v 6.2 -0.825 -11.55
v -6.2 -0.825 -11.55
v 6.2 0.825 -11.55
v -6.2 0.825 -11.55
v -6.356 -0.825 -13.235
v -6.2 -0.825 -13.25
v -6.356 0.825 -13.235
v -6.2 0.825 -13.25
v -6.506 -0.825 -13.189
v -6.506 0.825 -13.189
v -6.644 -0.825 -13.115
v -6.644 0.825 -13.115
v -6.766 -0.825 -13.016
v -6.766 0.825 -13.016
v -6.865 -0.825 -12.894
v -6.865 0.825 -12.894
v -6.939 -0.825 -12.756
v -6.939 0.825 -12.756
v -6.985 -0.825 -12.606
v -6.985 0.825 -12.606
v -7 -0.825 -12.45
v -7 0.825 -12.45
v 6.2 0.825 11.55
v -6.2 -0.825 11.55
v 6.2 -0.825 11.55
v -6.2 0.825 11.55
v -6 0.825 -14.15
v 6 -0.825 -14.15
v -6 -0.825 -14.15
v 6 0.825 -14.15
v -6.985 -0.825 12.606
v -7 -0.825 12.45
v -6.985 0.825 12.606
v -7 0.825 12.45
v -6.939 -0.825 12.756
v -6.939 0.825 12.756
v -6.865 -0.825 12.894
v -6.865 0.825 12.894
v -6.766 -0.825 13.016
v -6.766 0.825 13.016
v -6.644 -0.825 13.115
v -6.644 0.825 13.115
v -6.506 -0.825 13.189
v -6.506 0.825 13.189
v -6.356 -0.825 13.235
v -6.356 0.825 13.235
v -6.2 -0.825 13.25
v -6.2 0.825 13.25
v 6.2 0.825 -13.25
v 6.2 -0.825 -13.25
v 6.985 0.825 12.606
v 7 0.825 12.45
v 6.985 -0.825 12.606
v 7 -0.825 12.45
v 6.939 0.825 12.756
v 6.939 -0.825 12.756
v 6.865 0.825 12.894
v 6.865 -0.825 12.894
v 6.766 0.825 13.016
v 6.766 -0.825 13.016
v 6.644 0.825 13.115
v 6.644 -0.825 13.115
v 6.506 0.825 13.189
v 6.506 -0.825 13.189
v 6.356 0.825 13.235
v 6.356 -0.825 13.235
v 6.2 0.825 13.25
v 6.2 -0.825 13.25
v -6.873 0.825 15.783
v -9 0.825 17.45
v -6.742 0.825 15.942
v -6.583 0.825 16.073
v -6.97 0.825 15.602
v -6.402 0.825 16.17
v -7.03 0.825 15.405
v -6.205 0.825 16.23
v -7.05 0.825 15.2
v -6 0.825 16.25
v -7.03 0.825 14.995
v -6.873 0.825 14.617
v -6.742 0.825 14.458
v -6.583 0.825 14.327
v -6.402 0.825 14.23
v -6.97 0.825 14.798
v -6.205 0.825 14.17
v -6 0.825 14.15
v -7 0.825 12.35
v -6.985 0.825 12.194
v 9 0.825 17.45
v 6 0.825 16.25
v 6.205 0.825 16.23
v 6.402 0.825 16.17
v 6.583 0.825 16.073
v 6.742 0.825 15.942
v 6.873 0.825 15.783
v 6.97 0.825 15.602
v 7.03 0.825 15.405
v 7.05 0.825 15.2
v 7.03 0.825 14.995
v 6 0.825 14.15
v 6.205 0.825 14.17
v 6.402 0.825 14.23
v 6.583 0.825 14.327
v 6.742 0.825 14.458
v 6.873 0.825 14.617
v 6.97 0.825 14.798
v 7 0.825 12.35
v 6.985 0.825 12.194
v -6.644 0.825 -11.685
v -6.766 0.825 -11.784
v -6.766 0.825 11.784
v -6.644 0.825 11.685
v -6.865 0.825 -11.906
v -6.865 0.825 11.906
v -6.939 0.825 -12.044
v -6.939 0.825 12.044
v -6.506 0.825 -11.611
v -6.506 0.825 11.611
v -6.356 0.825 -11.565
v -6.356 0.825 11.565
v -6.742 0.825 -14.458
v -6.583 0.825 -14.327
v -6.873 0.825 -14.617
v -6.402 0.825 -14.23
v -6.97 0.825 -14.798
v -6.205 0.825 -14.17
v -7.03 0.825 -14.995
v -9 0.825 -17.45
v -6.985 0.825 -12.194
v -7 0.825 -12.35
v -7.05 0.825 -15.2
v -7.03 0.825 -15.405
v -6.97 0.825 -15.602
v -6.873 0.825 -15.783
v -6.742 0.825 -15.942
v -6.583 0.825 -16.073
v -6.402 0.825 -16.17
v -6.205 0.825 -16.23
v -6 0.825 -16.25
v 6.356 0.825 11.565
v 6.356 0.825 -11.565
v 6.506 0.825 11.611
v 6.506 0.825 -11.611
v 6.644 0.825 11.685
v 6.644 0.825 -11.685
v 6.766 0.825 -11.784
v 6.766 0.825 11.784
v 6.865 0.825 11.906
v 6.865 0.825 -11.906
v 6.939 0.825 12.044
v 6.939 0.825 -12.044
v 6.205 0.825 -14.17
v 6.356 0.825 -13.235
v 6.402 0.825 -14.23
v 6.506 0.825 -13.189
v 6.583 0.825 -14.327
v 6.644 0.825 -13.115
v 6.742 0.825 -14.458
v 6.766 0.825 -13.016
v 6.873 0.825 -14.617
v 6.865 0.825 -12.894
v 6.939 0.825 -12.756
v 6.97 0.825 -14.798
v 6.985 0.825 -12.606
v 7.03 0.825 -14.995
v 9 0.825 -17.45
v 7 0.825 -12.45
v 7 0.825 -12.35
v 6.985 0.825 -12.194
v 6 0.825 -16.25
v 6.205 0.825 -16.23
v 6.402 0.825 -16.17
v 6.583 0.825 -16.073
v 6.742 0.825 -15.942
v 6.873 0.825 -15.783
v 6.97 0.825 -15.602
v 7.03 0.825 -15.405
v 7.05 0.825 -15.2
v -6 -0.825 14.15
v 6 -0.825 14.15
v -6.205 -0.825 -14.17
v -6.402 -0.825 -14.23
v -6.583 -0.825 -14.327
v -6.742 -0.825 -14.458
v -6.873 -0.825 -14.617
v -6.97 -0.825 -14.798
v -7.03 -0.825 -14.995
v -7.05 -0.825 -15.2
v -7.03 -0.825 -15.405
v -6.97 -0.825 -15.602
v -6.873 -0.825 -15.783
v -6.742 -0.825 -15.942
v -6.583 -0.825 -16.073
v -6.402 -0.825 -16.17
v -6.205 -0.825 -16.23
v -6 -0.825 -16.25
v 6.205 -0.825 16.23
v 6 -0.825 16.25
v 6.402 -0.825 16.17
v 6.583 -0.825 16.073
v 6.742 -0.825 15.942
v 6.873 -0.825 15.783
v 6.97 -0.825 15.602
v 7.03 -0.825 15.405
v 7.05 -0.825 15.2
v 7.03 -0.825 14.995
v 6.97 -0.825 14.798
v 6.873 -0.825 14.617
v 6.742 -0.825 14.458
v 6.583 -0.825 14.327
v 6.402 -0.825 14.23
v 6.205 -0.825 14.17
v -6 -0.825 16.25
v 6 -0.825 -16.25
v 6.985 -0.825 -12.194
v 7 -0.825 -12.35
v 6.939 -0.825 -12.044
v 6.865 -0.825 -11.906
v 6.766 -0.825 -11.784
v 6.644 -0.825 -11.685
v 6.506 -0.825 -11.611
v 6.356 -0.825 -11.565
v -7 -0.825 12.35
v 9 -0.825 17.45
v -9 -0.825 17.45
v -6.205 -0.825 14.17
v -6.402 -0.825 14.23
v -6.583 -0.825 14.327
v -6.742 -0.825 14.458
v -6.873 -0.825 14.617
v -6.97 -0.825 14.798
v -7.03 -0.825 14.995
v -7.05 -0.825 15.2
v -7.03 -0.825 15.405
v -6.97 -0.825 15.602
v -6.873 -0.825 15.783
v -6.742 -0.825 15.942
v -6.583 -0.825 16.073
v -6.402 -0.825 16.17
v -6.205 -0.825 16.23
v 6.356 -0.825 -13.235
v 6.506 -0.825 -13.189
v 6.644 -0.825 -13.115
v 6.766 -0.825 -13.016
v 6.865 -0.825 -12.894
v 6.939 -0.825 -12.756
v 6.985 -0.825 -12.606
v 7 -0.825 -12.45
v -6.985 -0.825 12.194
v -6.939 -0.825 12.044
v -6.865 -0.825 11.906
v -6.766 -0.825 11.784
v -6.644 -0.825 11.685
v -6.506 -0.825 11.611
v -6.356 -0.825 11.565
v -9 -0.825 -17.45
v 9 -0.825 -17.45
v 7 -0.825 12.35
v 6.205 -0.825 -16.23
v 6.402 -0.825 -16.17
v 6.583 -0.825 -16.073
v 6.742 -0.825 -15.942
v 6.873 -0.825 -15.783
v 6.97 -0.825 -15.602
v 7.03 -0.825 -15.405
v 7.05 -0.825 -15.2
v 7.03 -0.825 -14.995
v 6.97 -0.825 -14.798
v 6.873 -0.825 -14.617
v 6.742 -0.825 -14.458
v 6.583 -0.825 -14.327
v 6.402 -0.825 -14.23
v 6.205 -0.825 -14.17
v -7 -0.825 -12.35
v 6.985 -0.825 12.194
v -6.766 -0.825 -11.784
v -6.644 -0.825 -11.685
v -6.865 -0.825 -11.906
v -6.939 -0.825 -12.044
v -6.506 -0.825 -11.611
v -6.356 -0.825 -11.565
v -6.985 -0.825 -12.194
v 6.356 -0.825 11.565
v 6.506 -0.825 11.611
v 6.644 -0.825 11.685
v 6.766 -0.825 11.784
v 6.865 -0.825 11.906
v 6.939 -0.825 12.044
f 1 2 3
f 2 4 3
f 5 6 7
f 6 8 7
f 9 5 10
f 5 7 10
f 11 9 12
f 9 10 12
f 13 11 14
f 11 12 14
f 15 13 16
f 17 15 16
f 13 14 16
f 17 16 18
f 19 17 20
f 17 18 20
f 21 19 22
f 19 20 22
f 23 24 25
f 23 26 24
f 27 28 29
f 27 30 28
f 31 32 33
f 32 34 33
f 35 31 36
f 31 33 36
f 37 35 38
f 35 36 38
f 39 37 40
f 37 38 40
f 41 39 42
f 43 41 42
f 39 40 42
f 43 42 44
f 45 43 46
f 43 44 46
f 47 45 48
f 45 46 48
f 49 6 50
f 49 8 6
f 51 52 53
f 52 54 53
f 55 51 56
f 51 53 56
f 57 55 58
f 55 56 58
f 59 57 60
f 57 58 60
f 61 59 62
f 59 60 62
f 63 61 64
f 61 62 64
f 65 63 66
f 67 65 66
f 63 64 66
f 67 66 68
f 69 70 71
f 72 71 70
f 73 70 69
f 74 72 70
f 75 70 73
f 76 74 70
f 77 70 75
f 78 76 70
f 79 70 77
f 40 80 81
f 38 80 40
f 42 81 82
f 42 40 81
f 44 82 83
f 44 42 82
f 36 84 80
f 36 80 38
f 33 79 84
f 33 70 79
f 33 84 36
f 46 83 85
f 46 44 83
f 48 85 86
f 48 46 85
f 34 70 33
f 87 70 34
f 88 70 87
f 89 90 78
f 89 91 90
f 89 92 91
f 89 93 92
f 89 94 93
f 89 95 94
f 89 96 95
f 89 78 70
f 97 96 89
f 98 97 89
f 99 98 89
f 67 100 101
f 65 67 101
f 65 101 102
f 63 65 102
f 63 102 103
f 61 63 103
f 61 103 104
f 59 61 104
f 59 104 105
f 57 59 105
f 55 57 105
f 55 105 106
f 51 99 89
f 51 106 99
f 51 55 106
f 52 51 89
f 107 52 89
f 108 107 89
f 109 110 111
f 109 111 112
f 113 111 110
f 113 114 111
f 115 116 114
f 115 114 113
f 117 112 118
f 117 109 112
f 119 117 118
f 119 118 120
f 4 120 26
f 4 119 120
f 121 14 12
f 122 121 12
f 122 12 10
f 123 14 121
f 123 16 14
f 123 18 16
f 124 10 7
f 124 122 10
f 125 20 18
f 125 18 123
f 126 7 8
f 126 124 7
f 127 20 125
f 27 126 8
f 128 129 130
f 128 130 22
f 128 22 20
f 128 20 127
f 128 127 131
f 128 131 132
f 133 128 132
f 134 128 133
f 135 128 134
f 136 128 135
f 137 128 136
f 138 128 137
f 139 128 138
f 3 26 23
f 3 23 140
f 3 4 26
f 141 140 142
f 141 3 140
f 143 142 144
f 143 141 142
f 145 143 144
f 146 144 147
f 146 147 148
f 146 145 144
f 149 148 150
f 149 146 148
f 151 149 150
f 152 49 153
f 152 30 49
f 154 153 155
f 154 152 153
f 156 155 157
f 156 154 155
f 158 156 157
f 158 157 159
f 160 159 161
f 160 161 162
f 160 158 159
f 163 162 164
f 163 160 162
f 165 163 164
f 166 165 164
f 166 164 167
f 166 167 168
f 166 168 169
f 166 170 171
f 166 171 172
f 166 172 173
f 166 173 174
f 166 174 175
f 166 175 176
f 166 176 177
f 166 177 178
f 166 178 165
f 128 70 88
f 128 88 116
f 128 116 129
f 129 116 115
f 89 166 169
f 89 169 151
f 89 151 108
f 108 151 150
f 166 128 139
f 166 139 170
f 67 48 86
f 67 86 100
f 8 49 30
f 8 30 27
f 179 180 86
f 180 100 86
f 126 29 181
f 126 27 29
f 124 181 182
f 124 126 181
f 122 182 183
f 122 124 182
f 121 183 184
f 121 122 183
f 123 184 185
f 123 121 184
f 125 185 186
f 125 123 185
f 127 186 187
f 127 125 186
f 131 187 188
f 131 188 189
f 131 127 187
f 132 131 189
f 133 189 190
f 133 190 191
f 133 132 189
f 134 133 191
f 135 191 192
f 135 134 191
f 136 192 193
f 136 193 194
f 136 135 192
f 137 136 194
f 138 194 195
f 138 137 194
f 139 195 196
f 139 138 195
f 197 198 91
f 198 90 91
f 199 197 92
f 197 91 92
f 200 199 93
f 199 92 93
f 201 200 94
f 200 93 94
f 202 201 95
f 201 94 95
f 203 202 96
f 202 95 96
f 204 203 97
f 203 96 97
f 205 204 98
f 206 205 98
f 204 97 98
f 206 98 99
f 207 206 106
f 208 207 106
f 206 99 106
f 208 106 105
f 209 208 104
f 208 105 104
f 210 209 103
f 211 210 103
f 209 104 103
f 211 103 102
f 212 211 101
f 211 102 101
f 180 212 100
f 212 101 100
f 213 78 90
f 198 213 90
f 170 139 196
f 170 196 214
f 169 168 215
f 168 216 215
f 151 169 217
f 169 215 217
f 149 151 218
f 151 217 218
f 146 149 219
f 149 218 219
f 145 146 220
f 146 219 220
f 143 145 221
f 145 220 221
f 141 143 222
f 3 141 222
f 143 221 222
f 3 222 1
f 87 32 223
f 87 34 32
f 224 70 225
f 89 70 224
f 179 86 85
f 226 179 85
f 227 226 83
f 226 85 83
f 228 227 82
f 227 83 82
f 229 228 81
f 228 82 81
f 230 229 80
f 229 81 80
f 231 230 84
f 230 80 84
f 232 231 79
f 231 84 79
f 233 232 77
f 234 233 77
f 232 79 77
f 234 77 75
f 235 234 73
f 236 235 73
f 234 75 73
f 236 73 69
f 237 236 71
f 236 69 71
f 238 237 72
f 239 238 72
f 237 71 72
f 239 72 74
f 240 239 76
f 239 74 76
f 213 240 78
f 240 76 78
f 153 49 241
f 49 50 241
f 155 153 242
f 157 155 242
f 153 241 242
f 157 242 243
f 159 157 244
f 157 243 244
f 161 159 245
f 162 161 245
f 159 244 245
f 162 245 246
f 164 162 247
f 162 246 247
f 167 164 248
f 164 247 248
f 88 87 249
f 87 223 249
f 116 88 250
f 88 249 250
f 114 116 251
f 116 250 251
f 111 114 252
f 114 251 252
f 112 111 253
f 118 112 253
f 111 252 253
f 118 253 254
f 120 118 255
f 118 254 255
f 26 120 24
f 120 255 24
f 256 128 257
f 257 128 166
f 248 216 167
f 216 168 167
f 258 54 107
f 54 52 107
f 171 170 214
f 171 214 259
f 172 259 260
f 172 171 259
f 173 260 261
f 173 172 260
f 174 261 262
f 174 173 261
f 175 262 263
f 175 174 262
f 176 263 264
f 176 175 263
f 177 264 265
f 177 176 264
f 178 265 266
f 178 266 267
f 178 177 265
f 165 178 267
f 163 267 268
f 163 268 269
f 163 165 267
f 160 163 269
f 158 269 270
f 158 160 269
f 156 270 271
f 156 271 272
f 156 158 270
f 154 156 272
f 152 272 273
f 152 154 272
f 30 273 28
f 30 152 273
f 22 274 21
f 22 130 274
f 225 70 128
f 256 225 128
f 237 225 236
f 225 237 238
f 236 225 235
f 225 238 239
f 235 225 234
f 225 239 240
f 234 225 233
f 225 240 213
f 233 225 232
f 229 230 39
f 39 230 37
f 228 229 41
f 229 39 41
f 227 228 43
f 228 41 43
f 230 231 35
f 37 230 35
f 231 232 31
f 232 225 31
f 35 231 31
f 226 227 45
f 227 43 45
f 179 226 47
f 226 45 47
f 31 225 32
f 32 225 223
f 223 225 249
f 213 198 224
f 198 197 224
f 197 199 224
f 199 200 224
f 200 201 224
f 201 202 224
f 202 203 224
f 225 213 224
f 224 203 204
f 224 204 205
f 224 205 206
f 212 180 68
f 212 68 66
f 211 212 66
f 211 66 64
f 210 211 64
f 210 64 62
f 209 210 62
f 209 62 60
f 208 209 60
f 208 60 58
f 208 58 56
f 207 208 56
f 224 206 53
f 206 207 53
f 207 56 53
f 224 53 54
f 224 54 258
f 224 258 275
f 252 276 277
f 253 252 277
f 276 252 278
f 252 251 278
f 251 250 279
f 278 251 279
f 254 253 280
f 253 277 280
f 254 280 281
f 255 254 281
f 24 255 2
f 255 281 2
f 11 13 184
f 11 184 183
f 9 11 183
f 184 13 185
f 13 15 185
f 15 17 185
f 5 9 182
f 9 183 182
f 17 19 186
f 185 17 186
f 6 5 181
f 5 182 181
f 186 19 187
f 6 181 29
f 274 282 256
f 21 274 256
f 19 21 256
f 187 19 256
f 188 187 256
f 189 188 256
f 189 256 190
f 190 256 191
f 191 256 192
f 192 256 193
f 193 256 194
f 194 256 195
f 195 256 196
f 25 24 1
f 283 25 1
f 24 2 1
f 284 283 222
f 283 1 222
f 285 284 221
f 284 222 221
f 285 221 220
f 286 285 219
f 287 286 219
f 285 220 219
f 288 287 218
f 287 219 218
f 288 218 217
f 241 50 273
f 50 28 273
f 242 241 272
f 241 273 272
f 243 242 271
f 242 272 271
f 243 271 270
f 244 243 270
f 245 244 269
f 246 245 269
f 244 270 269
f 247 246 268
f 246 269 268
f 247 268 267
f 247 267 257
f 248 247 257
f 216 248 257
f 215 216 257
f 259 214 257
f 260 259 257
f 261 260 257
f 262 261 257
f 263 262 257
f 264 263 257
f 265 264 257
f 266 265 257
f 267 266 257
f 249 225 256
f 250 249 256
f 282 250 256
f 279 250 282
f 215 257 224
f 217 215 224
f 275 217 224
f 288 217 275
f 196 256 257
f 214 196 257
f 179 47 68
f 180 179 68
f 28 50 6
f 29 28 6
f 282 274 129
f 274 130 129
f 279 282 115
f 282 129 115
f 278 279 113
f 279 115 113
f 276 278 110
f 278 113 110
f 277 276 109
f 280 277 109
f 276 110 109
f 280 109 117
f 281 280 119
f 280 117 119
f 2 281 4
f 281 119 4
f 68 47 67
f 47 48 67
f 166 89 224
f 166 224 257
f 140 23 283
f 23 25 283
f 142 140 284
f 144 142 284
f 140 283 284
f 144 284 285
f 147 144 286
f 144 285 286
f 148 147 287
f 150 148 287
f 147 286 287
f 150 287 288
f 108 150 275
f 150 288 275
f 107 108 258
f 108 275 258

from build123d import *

# Parameters (mm, degrees)
SKIZZE1_W                       = 18
SKIZZE1_H                       = 34.9
SKIZZE1_W_2                     = 14
SKIZZE1_H_2                     = 1.7
AUFSATZ_LINEAR_AUSTRAGEN1_DEPTH = 0.825
VERRUNDUNG1_R                   = 0.8


with BuildPart() as part:
    # Skizze1 → Aufsatz-Linear austragen1 (new body, symmetric)
    with BuildSketch(Plane(origin=(0, 0, 0), x_dir=(1, 0, 0), z_dir=(0, 1, 0))):
        Rectangle(SKIZZE1_W, SKIZZE1_H)
        with Locations((0, 12.4)):
            Rectangle(SKIZZE1_W_2, SKIZZE1_H_2, mode=Mode.SUBTRACT)
        with BuildLine():
            Line((-6, 16.25), (6, 16.25))
            ThreePointArc((6, 16.25), (7.05, 15.2), (6, 14.15))
            Line((6, 14.15), (-6, 14.15))
            ThreePointArc((-6, 14.15), (-7.05, 15.2), (-6, 16.25))
        make_face(mode=Mode.SUBTRACT)
        with BuildLine():
            Line((-6, -16.25), (6, -16.25))
            ThreePointArc((6, -16.25), (7.05, -15.2), (6, -14.15))
            Line((6, -14.15), (-6, -14.15))
            ThreePointArc((-6, -14.15), (-7.05, -15.2), (-6, -16.25))
        make_face(mode=Mode.SUBTRACT)
        with Locations((0, -12.4)):
            Rectangle(SKIZZE1_W_2, SKIZZE1_H_2, mode=Mode.SUBTRACT)
    extrude(amount=AUFSATZ_LINEAR_AUSTRAGEN1_DEPTH, both=True)

    # Verrundung1
    verrundung1_edges = [part.edges().sort_by_distance(p)[0] for p in [
        (-7, 0, -11.55),
        (-7, 0, -13.25),
        (7, 0, -13.25),
        (7, 0, -11.55),
        (7, 0, 13.25),
        (-7, 0, 13.25),
        (-7, 0, 11.55),
        (7, 0, 11.55),
    ]]
    fillet(verrundung1_edges, radius=VERRUNDUNG1_R)


solid = part.part
